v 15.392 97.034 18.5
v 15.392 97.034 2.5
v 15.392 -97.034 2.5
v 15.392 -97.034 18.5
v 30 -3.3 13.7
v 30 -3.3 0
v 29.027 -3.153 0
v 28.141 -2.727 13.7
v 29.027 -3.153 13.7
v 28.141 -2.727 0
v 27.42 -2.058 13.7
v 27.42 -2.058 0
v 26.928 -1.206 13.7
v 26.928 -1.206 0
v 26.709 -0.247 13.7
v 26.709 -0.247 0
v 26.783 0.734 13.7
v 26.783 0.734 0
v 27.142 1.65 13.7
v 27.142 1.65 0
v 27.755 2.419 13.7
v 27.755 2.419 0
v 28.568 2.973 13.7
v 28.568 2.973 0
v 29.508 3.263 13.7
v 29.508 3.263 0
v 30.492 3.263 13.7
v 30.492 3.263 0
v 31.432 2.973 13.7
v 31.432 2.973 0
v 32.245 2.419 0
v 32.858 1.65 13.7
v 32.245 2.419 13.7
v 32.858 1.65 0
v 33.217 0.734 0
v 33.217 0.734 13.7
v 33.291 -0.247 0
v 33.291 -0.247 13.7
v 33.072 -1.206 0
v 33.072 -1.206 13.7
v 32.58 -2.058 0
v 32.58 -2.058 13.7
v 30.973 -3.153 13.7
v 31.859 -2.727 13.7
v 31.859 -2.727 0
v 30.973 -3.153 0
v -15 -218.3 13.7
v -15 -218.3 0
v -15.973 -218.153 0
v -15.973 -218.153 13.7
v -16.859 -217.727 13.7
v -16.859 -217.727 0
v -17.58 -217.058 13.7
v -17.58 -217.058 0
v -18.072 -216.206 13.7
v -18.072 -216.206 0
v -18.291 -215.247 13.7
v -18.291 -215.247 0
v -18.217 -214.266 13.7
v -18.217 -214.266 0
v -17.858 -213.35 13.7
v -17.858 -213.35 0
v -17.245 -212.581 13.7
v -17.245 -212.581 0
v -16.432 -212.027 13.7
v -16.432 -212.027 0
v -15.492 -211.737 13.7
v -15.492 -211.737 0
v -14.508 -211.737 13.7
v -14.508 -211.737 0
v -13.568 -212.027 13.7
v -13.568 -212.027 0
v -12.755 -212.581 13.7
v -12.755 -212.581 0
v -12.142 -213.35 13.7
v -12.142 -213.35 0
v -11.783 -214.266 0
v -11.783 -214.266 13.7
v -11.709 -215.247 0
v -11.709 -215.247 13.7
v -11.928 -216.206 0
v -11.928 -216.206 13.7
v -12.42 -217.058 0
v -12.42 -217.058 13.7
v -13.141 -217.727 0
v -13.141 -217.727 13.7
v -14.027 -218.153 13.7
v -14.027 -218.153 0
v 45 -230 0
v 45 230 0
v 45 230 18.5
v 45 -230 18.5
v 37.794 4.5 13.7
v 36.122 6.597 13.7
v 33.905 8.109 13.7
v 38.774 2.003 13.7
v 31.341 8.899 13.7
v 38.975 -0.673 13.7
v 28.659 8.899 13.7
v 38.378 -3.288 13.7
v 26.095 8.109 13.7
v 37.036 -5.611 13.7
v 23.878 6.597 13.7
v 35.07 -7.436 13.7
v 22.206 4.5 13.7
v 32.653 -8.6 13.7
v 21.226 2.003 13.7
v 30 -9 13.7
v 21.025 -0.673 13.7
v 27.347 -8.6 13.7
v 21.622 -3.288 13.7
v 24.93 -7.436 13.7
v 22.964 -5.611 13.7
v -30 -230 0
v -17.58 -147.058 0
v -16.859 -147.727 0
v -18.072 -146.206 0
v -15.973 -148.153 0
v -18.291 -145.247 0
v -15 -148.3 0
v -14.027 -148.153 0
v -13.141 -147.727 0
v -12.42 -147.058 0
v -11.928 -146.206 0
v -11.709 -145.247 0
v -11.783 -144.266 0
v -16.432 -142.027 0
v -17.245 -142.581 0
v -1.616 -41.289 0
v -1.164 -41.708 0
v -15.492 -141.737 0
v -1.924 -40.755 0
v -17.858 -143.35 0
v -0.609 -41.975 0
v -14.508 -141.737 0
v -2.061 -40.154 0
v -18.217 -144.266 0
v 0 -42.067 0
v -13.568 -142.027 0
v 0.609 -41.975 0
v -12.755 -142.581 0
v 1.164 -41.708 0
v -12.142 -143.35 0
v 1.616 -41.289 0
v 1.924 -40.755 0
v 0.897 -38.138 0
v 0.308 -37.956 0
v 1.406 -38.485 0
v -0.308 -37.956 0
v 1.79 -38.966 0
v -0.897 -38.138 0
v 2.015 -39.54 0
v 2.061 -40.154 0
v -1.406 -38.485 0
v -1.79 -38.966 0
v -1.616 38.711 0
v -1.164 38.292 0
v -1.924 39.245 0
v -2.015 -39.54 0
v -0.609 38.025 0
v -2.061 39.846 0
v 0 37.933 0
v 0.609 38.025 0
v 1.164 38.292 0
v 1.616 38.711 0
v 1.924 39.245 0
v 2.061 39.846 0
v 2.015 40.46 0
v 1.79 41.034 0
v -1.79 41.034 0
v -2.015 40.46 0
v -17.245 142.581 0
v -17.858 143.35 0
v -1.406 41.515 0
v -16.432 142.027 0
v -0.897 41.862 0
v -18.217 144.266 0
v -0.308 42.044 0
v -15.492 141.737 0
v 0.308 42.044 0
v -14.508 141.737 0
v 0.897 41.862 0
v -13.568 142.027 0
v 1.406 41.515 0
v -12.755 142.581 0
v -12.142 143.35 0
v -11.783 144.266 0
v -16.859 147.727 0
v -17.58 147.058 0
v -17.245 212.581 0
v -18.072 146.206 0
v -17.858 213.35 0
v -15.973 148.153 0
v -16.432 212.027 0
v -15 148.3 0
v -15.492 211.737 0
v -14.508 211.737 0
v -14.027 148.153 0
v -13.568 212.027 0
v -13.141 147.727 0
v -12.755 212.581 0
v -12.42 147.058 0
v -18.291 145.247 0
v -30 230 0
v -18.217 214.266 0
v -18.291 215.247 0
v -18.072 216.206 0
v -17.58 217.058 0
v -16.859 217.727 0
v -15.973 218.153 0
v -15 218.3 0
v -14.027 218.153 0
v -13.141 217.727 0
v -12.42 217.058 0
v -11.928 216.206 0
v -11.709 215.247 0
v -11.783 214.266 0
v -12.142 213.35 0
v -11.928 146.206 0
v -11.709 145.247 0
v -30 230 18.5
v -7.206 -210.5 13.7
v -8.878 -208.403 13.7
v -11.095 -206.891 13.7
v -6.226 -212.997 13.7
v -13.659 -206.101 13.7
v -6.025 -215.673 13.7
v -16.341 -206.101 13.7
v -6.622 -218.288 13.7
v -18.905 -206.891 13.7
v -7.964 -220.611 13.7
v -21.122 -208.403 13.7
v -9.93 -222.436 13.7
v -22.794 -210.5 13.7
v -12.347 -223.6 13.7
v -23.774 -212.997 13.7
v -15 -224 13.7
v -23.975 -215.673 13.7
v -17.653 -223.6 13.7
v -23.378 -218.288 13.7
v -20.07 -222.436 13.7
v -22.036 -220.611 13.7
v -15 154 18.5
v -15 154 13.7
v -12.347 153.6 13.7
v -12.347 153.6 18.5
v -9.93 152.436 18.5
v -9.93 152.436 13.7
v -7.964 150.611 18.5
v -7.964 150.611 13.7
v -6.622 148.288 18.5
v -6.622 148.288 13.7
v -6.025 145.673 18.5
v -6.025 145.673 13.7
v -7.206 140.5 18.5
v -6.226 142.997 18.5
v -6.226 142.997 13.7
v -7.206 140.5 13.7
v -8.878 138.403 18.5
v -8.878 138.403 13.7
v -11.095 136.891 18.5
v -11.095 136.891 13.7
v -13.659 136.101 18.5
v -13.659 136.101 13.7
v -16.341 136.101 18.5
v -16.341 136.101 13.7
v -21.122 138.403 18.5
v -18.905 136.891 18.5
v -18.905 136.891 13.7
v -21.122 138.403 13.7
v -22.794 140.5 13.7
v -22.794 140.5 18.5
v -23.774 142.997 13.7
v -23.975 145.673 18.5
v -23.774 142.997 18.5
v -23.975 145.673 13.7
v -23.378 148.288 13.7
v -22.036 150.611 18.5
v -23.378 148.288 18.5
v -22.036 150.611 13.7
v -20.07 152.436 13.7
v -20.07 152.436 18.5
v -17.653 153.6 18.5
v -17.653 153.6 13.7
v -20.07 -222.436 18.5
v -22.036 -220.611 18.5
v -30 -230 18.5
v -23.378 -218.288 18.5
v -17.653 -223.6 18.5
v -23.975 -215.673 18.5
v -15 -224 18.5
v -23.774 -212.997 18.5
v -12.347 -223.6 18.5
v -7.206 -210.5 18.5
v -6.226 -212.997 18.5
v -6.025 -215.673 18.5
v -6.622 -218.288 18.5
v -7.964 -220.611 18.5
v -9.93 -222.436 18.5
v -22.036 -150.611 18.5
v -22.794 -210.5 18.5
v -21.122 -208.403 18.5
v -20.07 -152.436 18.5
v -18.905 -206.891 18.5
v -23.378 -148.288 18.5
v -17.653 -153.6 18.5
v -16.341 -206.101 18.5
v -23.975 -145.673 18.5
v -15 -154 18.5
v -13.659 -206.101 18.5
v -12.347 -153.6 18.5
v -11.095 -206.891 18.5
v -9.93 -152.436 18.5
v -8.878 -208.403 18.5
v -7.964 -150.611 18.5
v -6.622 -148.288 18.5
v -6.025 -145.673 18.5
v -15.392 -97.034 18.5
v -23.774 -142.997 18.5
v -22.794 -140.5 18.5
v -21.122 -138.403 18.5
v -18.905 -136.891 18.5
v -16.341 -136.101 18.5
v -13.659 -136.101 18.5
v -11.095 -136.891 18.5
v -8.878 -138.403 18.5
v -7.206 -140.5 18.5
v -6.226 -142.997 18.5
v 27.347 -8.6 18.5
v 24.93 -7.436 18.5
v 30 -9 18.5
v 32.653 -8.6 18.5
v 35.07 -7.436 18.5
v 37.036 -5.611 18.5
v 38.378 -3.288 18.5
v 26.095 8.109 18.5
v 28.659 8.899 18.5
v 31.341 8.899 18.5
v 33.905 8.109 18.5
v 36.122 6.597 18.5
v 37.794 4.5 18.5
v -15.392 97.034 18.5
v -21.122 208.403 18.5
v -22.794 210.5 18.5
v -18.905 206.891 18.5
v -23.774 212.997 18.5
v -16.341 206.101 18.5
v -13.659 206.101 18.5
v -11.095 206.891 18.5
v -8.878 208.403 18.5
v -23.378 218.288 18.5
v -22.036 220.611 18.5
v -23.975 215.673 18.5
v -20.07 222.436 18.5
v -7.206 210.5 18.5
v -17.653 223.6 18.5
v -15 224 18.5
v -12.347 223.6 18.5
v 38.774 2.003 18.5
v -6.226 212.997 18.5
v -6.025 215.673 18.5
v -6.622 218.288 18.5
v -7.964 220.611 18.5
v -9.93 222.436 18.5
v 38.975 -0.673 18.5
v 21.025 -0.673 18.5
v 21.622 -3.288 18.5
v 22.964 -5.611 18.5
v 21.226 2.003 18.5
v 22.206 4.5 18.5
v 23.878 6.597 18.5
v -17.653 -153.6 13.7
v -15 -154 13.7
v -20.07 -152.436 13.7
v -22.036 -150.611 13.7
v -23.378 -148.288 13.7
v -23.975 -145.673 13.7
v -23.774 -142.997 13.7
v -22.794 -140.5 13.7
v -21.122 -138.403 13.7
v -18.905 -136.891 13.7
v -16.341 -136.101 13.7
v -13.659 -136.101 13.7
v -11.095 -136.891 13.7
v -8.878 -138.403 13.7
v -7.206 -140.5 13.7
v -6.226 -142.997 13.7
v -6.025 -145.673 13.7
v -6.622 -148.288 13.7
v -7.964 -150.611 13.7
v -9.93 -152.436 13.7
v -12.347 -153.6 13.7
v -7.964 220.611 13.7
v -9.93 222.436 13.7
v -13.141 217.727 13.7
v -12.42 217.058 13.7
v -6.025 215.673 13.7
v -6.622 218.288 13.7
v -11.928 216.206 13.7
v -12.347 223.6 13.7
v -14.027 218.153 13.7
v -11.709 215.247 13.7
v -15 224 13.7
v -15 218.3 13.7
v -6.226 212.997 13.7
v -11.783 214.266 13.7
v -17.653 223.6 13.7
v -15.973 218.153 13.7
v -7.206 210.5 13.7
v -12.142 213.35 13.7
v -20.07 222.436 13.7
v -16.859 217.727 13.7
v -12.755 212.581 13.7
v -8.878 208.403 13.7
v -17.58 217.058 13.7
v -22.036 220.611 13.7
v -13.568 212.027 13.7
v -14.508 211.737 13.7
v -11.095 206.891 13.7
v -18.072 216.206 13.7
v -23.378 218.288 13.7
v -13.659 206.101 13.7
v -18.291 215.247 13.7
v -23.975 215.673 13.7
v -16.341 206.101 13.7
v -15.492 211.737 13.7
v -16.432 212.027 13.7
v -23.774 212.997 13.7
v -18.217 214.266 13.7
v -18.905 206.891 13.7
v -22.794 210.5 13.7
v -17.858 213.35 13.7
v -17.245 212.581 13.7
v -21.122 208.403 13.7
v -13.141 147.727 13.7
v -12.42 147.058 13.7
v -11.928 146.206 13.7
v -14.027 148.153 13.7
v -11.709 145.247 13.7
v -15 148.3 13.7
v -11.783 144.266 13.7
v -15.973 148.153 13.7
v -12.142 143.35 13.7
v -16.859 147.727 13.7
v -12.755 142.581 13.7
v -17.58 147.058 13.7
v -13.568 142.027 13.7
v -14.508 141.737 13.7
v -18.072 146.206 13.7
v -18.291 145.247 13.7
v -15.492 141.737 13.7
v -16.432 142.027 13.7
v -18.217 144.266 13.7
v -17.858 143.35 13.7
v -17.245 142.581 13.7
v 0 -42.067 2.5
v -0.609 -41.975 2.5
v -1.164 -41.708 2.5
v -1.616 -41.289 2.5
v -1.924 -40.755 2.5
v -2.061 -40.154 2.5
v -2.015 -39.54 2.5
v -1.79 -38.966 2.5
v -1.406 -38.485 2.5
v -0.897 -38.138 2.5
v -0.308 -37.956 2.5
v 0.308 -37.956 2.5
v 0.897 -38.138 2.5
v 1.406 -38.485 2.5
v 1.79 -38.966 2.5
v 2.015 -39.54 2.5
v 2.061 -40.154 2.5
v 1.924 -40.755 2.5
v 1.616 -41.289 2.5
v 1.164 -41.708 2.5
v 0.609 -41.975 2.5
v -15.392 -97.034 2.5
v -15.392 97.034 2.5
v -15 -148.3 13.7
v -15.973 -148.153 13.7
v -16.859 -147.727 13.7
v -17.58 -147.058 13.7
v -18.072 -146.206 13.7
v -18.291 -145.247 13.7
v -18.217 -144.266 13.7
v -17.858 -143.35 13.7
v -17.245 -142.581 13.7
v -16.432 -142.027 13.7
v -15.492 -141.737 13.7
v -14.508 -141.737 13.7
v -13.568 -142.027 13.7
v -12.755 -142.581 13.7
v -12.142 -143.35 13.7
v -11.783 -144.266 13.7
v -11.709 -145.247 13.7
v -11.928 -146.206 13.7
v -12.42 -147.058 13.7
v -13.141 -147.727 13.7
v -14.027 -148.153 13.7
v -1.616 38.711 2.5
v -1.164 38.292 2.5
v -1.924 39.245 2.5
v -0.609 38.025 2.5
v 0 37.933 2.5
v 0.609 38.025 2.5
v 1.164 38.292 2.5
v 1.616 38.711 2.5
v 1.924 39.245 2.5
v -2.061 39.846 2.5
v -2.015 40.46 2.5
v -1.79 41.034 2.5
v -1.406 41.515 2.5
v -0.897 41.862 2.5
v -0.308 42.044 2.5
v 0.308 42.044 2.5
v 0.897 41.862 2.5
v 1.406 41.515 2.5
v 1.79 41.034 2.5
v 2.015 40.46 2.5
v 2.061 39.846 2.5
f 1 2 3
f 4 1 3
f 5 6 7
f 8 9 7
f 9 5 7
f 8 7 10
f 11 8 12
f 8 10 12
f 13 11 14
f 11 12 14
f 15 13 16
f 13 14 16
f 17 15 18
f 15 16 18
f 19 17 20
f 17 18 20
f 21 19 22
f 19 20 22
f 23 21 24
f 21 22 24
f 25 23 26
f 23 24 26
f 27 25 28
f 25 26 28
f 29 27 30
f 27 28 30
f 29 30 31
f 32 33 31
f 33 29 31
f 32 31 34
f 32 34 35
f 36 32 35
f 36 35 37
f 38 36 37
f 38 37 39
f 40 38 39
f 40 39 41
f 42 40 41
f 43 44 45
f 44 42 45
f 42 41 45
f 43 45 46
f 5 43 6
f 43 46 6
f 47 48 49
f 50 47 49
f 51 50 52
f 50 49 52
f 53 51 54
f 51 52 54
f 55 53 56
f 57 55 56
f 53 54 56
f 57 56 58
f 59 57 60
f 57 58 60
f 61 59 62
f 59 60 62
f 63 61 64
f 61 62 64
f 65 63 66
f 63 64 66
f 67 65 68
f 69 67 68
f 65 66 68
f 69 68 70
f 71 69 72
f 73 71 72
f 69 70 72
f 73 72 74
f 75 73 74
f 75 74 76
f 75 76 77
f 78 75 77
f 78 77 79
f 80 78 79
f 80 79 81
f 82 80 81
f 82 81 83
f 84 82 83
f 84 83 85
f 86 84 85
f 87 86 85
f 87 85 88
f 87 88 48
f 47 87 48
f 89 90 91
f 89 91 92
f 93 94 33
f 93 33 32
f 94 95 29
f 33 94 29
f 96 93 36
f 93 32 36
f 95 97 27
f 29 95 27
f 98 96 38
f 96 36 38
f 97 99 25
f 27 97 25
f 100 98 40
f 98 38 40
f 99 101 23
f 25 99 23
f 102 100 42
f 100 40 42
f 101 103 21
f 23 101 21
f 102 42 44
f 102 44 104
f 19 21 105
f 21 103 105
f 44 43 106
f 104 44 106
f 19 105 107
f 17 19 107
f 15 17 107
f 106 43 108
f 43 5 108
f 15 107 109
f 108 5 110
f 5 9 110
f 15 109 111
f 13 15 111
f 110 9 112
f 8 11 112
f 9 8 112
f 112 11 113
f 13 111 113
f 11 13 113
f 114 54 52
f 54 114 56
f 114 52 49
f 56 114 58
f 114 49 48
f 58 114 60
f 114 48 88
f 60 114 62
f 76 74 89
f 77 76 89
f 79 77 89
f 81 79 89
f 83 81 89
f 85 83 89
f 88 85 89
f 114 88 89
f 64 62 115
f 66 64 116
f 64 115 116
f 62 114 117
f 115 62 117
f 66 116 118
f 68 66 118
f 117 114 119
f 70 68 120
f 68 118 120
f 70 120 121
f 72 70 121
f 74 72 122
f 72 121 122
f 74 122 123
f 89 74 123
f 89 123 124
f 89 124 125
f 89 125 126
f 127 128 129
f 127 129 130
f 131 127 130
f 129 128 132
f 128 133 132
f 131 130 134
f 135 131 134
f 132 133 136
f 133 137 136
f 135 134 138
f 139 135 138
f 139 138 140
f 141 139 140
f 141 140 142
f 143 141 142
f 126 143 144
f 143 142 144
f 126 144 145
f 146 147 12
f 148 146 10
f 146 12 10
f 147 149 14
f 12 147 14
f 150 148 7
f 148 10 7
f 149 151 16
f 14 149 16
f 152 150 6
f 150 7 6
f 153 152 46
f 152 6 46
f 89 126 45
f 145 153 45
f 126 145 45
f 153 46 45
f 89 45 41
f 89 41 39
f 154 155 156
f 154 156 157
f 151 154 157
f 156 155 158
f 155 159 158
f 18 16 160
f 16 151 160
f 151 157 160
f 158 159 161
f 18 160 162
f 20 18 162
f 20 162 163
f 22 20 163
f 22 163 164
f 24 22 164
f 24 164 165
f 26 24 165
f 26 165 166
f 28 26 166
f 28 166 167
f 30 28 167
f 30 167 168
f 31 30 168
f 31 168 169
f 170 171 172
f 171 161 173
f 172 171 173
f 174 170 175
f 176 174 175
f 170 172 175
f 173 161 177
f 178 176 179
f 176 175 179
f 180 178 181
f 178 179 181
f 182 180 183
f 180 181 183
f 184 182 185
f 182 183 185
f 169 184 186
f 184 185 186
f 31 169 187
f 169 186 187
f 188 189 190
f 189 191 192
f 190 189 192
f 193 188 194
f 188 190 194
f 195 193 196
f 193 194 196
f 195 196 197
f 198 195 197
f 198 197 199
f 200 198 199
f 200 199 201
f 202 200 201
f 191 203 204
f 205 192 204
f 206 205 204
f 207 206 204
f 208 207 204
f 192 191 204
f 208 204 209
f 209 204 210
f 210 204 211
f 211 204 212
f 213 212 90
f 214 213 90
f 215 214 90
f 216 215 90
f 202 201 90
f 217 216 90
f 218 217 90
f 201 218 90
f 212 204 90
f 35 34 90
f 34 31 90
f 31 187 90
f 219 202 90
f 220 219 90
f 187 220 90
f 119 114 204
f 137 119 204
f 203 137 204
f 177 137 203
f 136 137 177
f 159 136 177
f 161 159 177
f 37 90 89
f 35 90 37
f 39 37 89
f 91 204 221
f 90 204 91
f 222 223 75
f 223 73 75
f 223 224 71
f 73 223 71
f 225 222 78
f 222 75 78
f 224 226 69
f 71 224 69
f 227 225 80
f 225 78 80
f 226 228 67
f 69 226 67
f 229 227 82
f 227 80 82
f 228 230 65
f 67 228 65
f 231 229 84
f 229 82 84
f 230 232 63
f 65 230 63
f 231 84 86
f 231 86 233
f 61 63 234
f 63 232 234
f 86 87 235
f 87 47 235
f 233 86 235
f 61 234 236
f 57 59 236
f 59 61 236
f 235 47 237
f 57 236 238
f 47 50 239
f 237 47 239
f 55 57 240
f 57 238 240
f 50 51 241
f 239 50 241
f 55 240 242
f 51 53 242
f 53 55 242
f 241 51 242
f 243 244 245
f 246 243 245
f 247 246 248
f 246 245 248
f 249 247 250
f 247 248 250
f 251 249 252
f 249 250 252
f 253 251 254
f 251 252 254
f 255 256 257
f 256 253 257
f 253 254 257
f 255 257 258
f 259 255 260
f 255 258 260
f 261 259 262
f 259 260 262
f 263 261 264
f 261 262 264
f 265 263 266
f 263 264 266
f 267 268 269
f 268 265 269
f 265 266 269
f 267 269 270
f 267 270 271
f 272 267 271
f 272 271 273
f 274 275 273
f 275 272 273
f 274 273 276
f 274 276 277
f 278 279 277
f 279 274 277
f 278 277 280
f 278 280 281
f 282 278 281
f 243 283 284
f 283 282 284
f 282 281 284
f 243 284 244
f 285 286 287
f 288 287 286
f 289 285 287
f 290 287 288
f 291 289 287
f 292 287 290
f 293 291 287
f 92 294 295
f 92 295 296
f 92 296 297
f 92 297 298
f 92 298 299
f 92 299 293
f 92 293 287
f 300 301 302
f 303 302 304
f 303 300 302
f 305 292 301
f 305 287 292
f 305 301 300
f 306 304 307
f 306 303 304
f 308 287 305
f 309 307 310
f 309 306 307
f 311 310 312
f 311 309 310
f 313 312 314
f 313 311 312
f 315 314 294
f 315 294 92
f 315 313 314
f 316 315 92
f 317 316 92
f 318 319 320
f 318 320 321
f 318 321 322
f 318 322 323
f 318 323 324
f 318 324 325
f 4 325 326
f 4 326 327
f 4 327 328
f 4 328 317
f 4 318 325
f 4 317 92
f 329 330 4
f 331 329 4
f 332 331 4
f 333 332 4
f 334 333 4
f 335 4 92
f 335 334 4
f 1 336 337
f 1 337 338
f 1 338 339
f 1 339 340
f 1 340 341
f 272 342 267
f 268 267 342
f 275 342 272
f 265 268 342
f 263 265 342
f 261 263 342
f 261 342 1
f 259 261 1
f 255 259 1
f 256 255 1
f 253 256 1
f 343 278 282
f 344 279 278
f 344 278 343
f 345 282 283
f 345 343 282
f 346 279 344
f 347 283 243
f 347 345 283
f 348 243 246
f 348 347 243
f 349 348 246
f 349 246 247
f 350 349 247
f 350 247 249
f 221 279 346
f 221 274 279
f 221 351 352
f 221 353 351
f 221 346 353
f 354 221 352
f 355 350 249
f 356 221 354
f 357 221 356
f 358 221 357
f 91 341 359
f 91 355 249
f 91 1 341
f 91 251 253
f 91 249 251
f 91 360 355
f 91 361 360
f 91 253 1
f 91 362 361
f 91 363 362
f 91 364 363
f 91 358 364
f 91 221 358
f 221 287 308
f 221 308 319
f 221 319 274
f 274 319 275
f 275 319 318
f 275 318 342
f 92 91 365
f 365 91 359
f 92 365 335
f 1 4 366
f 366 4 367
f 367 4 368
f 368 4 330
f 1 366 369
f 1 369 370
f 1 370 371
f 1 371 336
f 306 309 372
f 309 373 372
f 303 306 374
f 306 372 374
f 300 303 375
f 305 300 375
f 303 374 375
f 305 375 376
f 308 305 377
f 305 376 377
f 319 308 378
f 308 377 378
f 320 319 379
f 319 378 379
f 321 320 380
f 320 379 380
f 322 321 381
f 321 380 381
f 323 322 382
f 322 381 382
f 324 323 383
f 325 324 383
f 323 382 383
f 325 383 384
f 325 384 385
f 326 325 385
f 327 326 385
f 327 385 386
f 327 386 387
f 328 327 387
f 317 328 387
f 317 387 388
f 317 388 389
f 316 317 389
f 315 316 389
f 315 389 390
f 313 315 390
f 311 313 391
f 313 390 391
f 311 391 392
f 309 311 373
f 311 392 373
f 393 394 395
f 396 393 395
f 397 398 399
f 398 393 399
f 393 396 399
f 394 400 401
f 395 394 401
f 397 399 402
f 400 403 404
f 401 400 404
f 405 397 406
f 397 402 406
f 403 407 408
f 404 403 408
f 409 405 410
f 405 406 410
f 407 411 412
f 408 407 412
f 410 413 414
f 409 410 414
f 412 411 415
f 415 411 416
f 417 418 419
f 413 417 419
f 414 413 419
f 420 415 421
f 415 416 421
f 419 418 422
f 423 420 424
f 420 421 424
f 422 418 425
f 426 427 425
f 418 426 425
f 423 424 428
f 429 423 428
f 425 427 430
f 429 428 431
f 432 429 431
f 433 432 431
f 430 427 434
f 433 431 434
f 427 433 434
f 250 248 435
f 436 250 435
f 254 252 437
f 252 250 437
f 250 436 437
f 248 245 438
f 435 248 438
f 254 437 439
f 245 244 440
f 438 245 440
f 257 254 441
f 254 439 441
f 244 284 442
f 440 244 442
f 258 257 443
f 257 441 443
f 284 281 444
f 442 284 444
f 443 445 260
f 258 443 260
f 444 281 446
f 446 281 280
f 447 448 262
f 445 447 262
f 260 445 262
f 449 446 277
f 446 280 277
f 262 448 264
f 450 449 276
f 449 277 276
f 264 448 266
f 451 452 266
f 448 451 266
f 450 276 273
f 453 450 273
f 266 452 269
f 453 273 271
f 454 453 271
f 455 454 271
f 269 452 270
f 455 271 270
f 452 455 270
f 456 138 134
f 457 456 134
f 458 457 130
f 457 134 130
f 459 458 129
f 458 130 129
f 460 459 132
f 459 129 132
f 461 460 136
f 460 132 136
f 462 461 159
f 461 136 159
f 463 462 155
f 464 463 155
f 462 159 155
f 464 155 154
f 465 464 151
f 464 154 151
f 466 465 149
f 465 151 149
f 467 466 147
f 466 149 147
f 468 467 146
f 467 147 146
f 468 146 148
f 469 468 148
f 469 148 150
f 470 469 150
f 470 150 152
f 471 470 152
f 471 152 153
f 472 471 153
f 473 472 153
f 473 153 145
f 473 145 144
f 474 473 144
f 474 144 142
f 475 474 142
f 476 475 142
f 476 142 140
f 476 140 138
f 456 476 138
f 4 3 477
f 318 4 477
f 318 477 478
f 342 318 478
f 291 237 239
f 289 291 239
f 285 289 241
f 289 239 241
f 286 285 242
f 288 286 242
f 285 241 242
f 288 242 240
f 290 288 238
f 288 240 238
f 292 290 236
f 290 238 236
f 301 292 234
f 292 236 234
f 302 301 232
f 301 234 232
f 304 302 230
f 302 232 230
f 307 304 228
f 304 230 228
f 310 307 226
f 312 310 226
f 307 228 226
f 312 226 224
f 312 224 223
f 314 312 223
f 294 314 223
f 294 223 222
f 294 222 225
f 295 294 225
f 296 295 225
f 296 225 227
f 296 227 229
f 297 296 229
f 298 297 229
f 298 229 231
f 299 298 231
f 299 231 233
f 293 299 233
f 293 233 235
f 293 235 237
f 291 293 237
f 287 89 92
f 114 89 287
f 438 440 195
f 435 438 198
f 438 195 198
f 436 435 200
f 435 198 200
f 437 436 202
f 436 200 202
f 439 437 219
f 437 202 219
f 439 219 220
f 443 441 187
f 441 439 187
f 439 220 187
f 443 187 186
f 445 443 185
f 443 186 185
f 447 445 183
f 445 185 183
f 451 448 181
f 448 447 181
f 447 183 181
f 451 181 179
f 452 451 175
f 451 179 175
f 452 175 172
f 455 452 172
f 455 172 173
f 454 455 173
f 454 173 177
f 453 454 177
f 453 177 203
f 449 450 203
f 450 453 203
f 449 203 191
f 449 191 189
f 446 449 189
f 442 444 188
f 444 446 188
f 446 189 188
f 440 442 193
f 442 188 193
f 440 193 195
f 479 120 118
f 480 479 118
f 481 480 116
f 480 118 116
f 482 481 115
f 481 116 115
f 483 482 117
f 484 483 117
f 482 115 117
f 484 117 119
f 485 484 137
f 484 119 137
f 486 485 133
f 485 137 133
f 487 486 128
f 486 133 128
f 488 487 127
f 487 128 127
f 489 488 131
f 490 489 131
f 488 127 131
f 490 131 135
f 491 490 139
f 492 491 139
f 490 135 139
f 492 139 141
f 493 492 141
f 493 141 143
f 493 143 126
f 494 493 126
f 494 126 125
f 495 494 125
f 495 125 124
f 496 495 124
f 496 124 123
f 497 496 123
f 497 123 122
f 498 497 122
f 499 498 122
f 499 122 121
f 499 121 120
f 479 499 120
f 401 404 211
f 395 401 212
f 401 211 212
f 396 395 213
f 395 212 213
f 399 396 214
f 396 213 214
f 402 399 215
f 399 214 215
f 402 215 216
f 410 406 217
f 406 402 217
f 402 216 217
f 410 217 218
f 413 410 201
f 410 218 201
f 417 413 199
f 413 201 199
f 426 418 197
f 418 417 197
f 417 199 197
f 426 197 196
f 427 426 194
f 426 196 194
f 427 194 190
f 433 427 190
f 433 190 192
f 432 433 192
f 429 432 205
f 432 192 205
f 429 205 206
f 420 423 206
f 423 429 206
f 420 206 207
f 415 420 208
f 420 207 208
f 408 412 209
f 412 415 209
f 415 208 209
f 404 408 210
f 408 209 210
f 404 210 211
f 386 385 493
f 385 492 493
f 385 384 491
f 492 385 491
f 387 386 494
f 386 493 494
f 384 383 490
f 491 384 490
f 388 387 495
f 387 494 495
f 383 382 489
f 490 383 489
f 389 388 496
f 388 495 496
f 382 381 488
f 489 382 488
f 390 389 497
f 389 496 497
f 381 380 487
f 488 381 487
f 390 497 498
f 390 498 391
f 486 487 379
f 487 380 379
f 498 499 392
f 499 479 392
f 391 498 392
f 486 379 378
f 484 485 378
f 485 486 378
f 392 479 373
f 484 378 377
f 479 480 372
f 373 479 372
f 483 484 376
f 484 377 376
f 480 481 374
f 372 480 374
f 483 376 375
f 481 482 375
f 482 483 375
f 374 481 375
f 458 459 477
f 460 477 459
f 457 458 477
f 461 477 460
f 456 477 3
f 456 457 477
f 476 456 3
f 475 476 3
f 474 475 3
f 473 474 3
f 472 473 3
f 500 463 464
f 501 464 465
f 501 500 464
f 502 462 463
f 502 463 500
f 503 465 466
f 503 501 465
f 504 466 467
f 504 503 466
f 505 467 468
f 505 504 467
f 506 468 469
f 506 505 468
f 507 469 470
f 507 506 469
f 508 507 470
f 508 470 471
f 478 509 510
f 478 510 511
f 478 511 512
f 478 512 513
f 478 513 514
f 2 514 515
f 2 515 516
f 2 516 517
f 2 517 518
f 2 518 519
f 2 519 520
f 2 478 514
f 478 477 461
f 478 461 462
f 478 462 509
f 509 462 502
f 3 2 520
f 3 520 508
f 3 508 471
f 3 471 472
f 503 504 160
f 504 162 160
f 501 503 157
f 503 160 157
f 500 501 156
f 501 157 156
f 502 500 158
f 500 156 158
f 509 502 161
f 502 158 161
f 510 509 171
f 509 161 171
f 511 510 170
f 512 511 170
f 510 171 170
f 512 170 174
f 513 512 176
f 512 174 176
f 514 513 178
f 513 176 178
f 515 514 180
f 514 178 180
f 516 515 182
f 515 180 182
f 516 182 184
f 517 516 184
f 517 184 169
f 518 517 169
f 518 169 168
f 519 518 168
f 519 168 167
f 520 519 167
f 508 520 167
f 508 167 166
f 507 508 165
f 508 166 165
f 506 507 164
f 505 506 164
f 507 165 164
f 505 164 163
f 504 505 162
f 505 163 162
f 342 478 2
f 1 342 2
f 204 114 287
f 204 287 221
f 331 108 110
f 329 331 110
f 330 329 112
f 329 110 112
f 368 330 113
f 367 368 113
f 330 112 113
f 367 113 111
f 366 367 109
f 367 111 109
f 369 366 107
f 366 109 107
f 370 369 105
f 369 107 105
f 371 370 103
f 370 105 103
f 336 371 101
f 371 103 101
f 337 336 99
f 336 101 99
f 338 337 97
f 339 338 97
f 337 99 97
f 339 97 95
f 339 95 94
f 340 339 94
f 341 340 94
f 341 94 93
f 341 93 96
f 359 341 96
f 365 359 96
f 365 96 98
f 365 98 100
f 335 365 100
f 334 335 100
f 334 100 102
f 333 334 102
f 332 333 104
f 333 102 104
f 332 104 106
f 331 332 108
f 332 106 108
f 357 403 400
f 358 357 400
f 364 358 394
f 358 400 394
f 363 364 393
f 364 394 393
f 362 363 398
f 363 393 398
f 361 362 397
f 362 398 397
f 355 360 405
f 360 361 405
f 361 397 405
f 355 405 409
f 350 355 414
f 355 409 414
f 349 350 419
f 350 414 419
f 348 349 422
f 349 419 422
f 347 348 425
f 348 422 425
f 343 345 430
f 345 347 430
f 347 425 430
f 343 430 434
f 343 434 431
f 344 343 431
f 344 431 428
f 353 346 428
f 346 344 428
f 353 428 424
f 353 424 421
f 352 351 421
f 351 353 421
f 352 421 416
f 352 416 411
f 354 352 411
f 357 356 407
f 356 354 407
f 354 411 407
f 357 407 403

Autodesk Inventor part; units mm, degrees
ref_plane "YZ Plane" through (0, 0, 0) normal (1, 0, 0) x (0, 1, 0)
ref_plane "XZ Plane" through (0, 0, 0) normal (0, 1, 0) x (-1, 0, 0)
ref_plane "XY Plane" through (0, 0, 0) normal (0, 0, 1) x (1, 0, 0)
sketch "Sketch1" plane through (0, 0, 0) normal (0, 0, 1) x (1, 0, 0)
  line L0 (-30, 230) -> (45, 230)
  line L1 (45, 230) -> (45, -230)
  line L2 (45, -230) -> (-30, -230)
  line L3 (-30, -230) -> (-30, 230)
  point P0 (0, 0)
  dimension "d0" = 30
  dimension "d1" = 45
  dimension "d2" = 460
  dimension "d3" = 230
extrude "baseExtrusion" add sketch "Sketch1" along normal blind 2.5
sketch "Sketch2" plane through (0, 0, 2.5) normal (0, 0, 1) x (1, 0, 0)
  line L0 (-30, 230) -> (-30, -230) projected
  point P0 (0, 0)
  point P1 (0, 40)
  point P2 (0, -40)
  dimension "d6" = 80
  dimension "d7" = 40
  dimension "d8" = 30
  dimension "d9" = 30
hole "xyStageAttatchM5" at (0, 40, 2.5) at (0, -40, 2.5) direction (0, 0, -1) diameter 4.134 depth 14.2 tip angle 118 thread size "M5x0.8" class "6H" standard "ISO Metric profile"
sketch "Sketch3" plane through (0, 0, 2.5) normal (0, 0, 1) x (1, 0, 0)
  line L0 (-30, 230) -> (45, 230)
  line L1 (45, 230) -> (45, -230)
  line L2 (45, -230) -> (-30, -230)
  line L3 (-30, -230) -> (-30, 230)
  line L4 (45, 230) -> (-30, 230) projected
  line L5 (-30, -230) -> (45, -230) projected
  line L6 (45, -230) -> (45, 230) projected
  line L7 (-30, 230) -> (-30, -230) projected
  line L8 (-15.3915, 97.0335) -> (15.3915, 97.0335)
  line L9 (15.3915, 97.0335) -> (15.3915, -97.0335)
  line L10 (15.3915, -97.0335) -> (-15.3915, -97.0335)
  line L11 (-15.3915, -97.0335) -> (-15.3915, 97.0335)
  point P0 (0, 0)
  dimension "d17" = 194.0669
  dimension "d18" = 97.0335
  dimension "d19" = 30.783
  dimension "d20" = 15.3915
extrude "Extrusion2" add sketch "Sketch3" along normal blind 16
sketch "Sketch4" plane through (0, 0, 18.5) normal (0, 0, 1) x (1, 0, 0)
  line L0 (-30, -230) -> (45, -230) projected
  line L1 (45, -230) -> (45, 230) projected
  line L2 (-30, 230) -> (-30, -230) projected
  point P0 (0, 0)
  point P1 (-15, -215)
  point P2 (-15, -145)
  point P3 (30, 0)
  dimension "d23" = 15
  dimension "d24" = 70
  dimension "d33" = 15
  dimension "d34" = 15
hole "Hole2" at (-15, -215, 18.5) at (-15, -145, 18.5) at (30, 0, 18.5) direction (0, 0, -1) diameter 6.6 end through all counterbore diameter 18 counterbore depth 4.8 clearance for "Hex Head Cap Screw ISO 24017" size "M6" standard "ISO"
mirror "Mirror1" about plane through (0, 0, 0) normal (0, 1, 0) of "Hole2"
equation "\"d3\" = 0.5 * d2"
equation "\"d7\" = 0.5 * d6"
equation "\"d8\" = d9"
equation "\"d18\" = 0.5 * d17"
equation "\"d20\" = 0.5 * d19"
properties part number "xyStageStilt"
